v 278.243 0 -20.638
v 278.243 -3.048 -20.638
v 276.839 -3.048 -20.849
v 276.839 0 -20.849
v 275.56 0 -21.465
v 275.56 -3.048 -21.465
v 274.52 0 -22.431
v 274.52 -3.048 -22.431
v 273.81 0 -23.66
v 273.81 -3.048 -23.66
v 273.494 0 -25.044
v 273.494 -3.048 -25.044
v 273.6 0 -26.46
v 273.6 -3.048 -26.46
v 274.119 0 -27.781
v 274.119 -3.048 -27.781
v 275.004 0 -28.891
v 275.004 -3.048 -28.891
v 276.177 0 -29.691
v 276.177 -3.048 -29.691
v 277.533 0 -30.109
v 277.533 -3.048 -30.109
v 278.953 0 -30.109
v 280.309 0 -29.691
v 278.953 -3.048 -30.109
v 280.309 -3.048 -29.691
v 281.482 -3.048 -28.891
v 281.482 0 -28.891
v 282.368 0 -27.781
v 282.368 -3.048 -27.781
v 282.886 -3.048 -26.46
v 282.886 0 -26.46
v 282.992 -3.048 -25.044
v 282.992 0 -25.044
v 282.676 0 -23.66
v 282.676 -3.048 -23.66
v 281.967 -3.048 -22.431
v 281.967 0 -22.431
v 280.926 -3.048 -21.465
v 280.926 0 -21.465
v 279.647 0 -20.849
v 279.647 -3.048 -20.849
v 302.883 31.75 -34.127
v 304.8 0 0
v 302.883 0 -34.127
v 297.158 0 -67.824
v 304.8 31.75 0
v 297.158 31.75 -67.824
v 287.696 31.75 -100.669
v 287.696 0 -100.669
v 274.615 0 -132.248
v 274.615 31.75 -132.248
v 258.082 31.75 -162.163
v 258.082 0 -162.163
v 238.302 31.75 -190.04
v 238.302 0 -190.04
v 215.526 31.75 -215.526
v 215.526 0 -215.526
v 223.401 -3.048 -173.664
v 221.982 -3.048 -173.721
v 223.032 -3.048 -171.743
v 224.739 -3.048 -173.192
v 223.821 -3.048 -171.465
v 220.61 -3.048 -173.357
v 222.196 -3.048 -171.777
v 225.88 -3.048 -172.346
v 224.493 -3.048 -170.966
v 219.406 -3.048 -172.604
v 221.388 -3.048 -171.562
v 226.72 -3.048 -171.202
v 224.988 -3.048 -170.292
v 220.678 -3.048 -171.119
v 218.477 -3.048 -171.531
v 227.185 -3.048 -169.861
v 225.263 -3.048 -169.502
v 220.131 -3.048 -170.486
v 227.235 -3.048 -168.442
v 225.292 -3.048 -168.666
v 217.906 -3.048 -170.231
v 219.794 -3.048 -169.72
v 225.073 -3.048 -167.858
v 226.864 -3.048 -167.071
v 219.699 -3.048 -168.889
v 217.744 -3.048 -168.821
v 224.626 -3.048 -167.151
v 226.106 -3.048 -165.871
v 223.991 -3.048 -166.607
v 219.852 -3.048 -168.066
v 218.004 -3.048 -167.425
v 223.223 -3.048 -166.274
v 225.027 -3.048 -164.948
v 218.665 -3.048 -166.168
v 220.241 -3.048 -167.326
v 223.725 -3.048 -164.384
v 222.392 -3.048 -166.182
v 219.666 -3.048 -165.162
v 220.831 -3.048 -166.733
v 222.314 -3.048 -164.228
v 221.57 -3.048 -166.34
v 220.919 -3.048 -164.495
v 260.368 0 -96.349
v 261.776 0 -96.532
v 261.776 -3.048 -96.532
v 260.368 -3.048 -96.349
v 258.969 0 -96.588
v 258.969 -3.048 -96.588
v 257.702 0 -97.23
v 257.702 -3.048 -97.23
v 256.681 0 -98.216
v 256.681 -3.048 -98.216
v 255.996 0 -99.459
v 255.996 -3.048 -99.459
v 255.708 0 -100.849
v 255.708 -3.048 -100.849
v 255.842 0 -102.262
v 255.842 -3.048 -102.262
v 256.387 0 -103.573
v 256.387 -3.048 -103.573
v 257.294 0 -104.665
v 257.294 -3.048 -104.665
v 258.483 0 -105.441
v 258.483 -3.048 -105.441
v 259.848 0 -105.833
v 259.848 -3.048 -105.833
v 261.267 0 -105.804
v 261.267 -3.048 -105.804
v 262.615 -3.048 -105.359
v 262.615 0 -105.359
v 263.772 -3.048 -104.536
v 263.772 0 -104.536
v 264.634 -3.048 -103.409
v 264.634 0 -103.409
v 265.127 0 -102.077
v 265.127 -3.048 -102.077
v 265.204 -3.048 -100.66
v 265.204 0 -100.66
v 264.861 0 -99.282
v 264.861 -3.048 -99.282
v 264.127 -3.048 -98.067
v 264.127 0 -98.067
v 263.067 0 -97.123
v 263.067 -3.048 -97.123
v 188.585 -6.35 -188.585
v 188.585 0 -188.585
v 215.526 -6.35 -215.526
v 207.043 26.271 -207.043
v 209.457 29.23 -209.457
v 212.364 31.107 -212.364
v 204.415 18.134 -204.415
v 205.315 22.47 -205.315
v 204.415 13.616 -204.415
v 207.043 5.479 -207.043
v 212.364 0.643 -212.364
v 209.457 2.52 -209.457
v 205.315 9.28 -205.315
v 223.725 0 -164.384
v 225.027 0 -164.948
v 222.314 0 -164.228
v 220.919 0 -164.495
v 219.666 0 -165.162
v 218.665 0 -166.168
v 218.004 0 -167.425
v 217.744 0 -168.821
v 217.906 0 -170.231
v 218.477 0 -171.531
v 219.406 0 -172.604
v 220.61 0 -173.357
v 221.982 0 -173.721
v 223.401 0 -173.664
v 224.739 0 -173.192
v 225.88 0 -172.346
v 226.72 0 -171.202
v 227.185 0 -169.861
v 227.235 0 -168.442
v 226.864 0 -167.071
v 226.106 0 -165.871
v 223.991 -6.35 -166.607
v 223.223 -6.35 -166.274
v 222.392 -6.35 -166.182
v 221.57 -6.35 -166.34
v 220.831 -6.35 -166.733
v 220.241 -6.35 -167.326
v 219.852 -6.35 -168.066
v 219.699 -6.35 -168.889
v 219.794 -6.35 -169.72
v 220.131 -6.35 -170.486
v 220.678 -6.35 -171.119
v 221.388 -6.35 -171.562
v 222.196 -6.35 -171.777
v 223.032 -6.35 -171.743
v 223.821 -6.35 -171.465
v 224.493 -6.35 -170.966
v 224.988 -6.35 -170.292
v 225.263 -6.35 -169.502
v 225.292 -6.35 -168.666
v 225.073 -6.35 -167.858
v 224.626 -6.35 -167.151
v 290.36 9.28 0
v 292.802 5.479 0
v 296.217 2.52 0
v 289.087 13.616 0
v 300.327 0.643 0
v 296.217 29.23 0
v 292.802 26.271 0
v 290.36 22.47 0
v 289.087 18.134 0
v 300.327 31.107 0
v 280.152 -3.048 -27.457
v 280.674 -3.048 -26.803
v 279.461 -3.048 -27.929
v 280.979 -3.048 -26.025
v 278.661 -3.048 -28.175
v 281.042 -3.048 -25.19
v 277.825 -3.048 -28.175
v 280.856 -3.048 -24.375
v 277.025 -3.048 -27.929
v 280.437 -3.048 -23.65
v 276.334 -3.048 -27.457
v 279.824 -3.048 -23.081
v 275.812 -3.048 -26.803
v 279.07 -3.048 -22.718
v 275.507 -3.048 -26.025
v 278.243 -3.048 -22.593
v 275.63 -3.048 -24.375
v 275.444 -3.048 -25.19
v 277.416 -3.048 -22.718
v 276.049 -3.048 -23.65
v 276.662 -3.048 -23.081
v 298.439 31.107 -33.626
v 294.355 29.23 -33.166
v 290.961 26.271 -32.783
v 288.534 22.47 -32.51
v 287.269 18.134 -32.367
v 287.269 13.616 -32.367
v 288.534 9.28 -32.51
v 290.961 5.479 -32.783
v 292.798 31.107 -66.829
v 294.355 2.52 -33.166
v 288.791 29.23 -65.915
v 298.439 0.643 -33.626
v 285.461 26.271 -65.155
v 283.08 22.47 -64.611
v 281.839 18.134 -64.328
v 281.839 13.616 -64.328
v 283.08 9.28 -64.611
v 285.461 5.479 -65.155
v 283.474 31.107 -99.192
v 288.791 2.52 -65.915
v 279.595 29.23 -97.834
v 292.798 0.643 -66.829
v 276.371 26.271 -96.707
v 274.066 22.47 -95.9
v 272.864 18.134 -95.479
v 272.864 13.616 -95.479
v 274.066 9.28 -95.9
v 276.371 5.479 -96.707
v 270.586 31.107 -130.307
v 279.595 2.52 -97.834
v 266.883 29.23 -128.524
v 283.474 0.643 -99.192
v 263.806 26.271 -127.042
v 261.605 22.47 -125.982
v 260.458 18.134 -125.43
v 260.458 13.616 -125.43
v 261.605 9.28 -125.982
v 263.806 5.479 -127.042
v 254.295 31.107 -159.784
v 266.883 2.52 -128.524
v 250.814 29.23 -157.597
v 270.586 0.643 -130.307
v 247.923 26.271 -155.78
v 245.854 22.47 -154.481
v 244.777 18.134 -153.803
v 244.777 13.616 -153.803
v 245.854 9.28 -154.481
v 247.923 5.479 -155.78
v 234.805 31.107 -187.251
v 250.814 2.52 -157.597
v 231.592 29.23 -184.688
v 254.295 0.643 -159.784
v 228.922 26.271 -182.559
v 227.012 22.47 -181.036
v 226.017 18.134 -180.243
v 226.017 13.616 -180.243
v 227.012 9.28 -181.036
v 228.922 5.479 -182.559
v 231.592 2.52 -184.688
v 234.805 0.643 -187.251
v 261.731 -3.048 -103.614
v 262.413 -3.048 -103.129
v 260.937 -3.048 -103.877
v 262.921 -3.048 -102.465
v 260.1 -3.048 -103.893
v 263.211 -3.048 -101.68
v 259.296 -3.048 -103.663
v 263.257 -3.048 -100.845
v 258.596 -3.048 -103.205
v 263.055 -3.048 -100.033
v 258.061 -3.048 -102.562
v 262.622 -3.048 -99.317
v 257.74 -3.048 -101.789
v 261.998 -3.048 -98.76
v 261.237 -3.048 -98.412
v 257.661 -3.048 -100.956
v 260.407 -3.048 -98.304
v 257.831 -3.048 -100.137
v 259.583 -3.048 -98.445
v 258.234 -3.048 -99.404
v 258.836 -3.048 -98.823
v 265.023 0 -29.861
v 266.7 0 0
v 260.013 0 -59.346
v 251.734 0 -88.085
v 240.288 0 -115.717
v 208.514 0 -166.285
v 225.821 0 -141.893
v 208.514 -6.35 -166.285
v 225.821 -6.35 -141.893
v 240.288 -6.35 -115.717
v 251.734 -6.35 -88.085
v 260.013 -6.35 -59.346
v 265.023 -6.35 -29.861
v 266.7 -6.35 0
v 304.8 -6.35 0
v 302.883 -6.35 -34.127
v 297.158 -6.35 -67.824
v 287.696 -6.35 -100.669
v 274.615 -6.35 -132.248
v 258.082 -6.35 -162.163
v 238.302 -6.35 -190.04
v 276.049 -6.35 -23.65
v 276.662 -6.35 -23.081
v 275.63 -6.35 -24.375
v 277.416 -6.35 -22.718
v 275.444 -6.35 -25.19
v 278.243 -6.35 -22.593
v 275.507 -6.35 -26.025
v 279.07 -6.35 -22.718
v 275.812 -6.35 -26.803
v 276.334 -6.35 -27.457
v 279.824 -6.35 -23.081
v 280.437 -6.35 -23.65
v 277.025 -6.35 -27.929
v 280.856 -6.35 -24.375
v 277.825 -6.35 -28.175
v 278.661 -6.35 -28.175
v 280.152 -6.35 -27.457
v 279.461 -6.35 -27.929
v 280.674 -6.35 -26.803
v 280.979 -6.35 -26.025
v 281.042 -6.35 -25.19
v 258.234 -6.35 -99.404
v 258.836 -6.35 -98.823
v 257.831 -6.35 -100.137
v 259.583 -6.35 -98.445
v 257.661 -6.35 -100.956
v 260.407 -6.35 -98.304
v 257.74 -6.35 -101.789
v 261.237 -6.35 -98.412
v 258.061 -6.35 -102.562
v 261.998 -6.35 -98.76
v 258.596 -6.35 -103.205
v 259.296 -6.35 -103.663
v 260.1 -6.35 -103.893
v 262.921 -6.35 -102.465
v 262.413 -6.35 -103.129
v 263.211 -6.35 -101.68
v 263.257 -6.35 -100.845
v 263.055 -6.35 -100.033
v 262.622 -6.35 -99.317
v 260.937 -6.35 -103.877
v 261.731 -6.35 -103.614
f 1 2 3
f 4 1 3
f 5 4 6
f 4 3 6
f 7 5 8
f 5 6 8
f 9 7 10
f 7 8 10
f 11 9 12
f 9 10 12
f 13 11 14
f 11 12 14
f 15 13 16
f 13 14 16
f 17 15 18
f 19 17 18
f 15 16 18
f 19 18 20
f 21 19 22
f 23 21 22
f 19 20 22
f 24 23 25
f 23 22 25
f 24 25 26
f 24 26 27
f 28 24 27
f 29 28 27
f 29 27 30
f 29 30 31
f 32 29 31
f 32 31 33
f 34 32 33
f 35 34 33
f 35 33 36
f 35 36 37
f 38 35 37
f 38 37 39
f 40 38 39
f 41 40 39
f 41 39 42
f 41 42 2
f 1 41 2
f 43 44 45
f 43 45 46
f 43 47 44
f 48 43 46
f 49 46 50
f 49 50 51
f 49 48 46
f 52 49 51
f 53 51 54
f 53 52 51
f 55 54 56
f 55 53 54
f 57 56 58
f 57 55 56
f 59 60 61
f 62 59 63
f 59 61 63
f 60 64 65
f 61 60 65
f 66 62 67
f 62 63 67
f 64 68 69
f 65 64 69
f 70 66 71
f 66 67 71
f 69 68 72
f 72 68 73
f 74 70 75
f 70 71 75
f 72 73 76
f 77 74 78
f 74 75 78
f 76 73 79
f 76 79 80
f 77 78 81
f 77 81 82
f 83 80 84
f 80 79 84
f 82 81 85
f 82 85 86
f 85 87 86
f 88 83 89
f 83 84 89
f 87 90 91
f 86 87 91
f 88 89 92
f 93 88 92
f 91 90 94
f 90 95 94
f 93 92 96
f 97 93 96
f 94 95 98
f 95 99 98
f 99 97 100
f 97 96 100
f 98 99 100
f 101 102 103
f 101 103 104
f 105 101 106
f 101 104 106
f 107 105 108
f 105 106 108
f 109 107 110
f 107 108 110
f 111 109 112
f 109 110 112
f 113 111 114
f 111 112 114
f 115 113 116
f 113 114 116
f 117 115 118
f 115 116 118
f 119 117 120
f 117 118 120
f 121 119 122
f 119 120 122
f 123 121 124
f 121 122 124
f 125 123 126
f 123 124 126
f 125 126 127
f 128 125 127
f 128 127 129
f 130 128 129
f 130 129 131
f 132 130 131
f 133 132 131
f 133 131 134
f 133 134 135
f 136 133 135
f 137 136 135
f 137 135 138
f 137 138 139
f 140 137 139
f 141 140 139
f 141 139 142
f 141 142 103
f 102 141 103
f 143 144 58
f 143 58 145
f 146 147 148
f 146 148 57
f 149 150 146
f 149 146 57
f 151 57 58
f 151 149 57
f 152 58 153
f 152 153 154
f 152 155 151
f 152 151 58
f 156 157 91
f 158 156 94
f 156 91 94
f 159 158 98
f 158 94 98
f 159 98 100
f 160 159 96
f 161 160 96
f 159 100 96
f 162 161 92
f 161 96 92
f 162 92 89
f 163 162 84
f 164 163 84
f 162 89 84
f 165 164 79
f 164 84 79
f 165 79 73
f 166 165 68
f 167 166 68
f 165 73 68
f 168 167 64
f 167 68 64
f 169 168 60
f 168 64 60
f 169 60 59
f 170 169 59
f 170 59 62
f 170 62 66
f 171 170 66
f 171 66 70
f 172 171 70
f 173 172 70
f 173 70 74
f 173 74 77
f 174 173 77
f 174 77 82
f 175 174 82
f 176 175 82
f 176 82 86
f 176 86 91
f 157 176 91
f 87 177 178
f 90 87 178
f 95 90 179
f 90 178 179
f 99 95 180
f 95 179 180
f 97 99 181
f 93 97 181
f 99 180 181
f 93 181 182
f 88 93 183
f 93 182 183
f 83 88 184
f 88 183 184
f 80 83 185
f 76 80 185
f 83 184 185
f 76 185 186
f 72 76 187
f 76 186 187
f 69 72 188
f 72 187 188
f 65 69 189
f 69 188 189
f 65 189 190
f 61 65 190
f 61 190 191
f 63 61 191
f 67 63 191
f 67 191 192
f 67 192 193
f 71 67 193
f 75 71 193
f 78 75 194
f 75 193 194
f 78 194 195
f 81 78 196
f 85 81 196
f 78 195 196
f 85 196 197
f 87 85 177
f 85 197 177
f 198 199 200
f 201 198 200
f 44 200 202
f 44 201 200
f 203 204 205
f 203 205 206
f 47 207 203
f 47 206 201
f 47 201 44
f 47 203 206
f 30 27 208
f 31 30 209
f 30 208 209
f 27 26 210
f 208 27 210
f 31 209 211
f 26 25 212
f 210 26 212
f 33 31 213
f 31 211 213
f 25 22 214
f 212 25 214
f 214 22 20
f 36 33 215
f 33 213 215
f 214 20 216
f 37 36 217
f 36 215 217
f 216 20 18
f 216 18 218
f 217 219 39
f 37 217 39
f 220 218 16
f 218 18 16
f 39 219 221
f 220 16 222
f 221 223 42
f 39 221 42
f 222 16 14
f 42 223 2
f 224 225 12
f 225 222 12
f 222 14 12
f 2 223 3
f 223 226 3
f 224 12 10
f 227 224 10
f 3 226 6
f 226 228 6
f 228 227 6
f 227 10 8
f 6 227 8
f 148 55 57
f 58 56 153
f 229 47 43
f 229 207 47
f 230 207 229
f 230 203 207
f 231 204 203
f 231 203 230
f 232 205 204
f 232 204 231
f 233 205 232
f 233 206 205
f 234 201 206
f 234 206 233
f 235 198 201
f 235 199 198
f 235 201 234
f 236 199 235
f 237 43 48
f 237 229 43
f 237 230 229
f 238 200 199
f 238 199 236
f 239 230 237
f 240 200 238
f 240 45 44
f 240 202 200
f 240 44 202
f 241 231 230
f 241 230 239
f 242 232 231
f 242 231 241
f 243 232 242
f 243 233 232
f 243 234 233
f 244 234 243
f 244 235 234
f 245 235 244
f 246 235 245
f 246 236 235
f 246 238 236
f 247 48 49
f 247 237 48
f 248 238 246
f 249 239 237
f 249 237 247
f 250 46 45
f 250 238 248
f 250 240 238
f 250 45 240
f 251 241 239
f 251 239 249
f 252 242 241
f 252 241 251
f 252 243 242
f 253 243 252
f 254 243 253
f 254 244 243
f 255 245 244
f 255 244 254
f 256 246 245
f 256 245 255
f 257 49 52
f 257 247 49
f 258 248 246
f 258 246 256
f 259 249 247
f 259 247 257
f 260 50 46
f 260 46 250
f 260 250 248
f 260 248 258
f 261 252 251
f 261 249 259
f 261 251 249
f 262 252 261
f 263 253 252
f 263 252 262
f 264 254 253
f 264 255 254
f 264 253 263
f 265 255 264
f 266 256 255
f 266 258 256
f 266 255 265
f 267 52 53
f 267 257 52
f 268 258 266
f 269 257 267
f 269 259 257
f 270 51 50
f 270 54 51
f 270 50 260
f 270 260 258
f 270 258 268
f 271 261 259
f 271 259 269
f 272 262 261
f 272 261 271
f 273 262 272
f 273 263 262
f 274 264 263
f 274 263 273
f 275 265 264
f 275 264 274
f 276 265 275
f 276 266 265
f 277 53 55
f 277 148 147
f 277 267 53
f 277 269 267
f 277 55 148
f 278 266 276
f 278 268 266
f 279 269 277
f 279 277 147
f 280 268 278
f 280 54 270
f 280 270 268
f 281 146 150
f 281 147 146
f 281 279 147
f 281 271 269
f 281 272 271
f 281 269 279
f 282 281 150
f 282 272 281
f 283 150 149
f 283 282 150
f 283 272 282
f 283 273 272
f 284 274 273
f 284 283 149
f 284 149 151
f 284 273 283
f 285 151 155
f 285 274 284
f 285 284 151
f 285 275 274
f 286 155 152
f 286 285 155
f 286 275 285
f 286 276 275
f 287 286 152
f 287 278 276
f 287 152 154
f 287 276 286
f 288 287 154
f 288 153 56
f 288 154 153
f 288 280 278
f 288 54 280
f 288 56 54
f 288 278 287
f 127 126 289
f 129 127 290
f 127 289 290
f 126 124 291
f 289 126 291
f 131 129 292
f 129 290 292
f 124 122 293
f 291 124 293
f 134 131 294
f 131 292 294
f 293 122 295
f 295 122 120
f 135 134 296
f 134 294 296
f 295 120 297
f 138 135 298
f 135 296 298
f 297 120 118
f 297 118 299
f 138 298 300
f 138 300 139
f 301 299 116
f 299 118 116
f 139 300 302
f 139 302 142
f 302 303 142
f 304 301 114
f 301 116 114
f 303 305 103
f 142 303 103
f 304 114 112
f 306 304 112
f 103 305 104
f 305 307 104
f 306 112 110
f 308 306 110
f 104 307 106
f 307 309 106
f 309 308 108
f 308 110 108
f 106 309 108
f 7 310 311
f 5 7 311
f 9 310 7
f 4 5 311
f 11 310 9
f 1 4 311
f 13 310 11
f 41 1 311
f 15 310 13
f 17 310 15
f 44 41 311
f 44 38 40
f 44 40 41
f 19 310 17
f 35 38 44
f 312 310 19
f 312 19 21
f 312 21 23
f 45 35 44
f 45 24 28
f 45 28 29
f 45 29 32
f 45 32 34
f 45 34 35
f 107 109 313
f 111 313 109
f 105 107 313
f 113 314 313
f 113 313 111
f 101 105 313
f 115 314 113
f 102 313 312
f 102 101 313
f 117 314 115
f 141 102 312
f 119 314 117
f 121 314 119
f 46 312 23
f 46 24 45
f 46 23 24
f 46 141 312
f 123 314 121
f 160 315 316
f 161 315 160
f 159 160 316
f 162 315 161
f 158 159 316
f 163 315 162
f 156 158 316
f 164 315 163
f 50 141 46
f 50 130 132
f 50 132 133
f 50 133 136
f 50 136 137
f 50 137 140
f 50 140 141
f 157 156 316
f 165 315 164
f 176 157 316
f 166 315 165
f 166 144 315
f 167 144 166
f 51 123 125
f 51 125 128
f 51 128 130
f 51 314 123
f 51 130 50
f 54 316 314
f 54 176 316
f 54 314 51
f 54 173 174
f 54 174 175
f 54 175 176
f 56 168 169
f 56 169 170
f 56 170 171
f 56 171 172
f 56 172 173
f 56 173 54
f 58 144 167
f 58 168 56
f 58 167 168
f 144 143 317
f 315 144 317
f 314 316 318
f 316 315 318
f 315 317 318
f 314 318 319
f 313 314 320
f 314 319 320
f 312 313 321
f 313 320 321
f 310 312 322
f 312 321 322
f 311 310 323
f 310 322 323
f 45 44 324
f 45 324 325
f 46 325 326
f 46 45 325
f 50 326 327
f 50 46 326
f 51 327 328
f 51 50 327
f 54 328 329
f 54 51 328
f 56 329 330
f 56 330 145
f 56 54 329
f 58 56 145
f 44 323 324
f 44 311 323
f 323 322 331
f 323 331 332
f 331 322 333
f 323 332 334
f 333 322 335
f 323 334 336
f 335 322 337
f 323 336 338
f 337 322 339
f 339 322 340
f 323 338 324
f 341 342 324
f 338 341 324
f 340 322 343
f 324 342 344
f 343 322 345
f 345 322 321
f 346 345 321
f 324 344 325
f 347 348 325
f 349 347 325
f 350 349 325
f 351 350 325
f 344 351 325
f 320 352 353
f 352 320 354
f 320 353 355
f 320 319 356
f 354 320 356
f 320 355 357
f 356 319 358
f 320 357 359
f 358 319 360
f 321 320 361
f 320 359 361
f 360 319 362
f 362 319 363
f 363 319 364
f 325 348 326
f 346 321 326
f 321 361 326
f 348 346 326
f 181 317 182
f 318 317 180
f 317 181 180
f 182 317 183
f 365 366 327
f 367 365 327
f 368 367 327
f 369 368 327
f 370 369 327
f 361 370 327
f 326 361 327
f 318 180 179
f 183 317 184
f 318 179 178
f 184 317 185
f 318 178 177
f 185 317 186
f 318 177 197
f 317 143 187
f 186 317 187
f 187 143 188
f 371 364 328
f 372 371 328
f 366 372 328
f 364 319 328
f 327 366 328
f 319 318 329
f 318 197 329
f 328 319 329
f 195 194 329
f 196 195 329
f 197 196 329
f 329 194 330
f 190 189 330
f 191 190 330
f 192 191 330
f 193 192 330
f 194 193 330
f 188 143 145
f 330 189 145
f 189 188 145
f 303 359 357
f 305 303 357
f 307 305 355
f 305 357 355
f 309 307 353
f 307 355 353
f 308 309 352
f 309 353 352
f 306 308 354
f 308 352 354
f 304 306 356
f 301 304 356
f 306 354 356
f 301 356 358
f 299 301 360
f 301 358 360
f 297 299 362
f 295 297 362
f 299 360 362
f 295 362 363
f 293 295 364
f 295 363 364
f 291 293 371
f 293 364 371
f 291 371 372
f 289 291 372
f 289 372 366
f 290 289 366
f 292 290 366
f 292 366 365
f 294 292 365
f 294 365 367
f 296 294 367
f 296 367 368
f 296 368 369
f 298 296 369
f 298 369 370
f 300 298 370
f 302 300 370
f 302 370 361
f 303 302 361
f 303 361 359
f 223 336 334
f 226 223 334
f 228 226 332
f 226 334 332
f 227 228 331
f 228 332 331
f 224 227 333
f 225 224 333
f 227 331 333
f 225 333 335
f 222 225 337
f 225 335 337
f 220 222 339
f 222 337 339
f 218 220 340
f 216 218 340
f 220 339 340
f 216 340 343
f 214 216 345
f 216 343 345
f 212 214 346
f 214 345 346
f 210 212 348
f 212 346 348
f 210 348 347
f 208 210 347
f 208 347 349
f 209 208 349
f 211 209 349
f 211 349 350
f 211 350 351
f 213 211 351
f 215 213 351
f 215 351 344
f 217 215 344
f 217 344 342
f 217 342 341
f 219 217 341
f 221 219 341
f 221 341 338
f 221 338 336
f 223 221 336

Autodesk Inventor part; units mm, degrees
ref_plane "YZ Plane" through (0, 0, 0) normal (1, 0, 0) x (0, 1, 0)
ref_plane "XZ Plane" through (0, 0, 0) normal (0, 1, 0) x (-1, 0, 0)
sketch "Sketch2" plane through (0, 0, 0) normal (0, 0, 1) x (1, 0, 0)
  line L0 (304.8, 0) -> (304.8, 31.75)
  arc A0 (304.8, 31.75) -> (304.8, 0) centre (304.8, 15.875) ccw
  line L1 (304.8, 0) -> (266.7, 0)
  line L2 (266.7, 0) -> (266.7, -6.35)
  line L3 (266.7, -6.35) -> (304.8, -6.35)
  line L4 (304.8, -6.35) -> (304.8, 0)
  line L5 (0, 0) -> (304.8, 0) construction
  line L6 (0, -13.97) -> (0, 39.37) projected
  dimension "d0" = 31.75
  dimension "d1" = 304.8
  dimension "d2" = 6.35
  dimension "d8" = 15.875
  dimension "d9" = 38.1
revolve "Revolution1" add sketch "Sketch2" angle 90 about axis through (0, -10, 0) along (0, 1, 0)
sketch "Sketch4" plane through (266.7, 0, 0) normal (0, 1, 0) x (1, 0, 0)
  line L0 (38.1, 0) -> (0, 0) projected
  point P0 (-266.7, 0)
  point P1 (11.5431, 25.4)
  dimension "d10" = 279.4
  dimension "d18" = 25.4
hole "Hole1" at (278.2431, 0, -25.4) direction (0, -1, 0) diameter 5.6134 end through all counterbore diameter 9.525 counterbore depth 3.048 clearance for "Hex Machine Screw" size "#10" standard "Ansi Unified Screw Threads"
pattern_circular "Circular Pattern1" count 6 over 80 about axis through (0, -10, 0) along (0, 1, 0) of "Hole1"
ref_plane "Work Plane1" through (0, 0, 0) normal (0.7071, 0, 0.7071) x (0, 1, 0)
split "Split1" plane through (0, 0, 0) removes the side toward (-0.7071, 0, -0.7071)
sketch "Sketch3" plane through (0, -6.35, -266.7) normal (-1, 0, 0) x (0, 0, 1)
  arc A0 (-38.1, 6.35) -> (-38.1, 38.1) centre (-38.1, 22.225) ccw projected
  line L0 (-38.1, 38.1) -> (-38.1, 6.35) projected
  line L1 (-38.1, 6.35) -> (-38.1, 38.1)
  line L2 (-38.1, 0) -> (0, 0) projected
  line L3 (-38.1, 6.35) -> (-38.1, 0)
  line L4 (-38.1, 0) -> (0, 0)
  line L5 (0, 6.35) -> (-38.1, 6.35)
  arc A1 (-38.1, 6.35) -> (-38.1, 38.1) centre (-38.1, 22.225) ccw
  line L6 (266.7, 6.35) -> (0, 6.35) projected
  line L7 (0, 0) -> (0, 6.35) projected
  line L8 (0, 6.35) -> (0, 0)
equation "\"d1\" = outerRadius"
equation "\"d8\" = spacerRadius"
equation "\"wheelDiameter\" = 184.15"
equation "\"frisbeeDiameter\" = 228.6"
equation "\"outerRadius\" = 304.8"
equation "\"wheelRadius\" = 0.5 * wheelDiameter"
equation "\"spacerRadius\" = 15.875"
properties part number "Whack01-RunnerForFrisbeeShooterOneHalf"
